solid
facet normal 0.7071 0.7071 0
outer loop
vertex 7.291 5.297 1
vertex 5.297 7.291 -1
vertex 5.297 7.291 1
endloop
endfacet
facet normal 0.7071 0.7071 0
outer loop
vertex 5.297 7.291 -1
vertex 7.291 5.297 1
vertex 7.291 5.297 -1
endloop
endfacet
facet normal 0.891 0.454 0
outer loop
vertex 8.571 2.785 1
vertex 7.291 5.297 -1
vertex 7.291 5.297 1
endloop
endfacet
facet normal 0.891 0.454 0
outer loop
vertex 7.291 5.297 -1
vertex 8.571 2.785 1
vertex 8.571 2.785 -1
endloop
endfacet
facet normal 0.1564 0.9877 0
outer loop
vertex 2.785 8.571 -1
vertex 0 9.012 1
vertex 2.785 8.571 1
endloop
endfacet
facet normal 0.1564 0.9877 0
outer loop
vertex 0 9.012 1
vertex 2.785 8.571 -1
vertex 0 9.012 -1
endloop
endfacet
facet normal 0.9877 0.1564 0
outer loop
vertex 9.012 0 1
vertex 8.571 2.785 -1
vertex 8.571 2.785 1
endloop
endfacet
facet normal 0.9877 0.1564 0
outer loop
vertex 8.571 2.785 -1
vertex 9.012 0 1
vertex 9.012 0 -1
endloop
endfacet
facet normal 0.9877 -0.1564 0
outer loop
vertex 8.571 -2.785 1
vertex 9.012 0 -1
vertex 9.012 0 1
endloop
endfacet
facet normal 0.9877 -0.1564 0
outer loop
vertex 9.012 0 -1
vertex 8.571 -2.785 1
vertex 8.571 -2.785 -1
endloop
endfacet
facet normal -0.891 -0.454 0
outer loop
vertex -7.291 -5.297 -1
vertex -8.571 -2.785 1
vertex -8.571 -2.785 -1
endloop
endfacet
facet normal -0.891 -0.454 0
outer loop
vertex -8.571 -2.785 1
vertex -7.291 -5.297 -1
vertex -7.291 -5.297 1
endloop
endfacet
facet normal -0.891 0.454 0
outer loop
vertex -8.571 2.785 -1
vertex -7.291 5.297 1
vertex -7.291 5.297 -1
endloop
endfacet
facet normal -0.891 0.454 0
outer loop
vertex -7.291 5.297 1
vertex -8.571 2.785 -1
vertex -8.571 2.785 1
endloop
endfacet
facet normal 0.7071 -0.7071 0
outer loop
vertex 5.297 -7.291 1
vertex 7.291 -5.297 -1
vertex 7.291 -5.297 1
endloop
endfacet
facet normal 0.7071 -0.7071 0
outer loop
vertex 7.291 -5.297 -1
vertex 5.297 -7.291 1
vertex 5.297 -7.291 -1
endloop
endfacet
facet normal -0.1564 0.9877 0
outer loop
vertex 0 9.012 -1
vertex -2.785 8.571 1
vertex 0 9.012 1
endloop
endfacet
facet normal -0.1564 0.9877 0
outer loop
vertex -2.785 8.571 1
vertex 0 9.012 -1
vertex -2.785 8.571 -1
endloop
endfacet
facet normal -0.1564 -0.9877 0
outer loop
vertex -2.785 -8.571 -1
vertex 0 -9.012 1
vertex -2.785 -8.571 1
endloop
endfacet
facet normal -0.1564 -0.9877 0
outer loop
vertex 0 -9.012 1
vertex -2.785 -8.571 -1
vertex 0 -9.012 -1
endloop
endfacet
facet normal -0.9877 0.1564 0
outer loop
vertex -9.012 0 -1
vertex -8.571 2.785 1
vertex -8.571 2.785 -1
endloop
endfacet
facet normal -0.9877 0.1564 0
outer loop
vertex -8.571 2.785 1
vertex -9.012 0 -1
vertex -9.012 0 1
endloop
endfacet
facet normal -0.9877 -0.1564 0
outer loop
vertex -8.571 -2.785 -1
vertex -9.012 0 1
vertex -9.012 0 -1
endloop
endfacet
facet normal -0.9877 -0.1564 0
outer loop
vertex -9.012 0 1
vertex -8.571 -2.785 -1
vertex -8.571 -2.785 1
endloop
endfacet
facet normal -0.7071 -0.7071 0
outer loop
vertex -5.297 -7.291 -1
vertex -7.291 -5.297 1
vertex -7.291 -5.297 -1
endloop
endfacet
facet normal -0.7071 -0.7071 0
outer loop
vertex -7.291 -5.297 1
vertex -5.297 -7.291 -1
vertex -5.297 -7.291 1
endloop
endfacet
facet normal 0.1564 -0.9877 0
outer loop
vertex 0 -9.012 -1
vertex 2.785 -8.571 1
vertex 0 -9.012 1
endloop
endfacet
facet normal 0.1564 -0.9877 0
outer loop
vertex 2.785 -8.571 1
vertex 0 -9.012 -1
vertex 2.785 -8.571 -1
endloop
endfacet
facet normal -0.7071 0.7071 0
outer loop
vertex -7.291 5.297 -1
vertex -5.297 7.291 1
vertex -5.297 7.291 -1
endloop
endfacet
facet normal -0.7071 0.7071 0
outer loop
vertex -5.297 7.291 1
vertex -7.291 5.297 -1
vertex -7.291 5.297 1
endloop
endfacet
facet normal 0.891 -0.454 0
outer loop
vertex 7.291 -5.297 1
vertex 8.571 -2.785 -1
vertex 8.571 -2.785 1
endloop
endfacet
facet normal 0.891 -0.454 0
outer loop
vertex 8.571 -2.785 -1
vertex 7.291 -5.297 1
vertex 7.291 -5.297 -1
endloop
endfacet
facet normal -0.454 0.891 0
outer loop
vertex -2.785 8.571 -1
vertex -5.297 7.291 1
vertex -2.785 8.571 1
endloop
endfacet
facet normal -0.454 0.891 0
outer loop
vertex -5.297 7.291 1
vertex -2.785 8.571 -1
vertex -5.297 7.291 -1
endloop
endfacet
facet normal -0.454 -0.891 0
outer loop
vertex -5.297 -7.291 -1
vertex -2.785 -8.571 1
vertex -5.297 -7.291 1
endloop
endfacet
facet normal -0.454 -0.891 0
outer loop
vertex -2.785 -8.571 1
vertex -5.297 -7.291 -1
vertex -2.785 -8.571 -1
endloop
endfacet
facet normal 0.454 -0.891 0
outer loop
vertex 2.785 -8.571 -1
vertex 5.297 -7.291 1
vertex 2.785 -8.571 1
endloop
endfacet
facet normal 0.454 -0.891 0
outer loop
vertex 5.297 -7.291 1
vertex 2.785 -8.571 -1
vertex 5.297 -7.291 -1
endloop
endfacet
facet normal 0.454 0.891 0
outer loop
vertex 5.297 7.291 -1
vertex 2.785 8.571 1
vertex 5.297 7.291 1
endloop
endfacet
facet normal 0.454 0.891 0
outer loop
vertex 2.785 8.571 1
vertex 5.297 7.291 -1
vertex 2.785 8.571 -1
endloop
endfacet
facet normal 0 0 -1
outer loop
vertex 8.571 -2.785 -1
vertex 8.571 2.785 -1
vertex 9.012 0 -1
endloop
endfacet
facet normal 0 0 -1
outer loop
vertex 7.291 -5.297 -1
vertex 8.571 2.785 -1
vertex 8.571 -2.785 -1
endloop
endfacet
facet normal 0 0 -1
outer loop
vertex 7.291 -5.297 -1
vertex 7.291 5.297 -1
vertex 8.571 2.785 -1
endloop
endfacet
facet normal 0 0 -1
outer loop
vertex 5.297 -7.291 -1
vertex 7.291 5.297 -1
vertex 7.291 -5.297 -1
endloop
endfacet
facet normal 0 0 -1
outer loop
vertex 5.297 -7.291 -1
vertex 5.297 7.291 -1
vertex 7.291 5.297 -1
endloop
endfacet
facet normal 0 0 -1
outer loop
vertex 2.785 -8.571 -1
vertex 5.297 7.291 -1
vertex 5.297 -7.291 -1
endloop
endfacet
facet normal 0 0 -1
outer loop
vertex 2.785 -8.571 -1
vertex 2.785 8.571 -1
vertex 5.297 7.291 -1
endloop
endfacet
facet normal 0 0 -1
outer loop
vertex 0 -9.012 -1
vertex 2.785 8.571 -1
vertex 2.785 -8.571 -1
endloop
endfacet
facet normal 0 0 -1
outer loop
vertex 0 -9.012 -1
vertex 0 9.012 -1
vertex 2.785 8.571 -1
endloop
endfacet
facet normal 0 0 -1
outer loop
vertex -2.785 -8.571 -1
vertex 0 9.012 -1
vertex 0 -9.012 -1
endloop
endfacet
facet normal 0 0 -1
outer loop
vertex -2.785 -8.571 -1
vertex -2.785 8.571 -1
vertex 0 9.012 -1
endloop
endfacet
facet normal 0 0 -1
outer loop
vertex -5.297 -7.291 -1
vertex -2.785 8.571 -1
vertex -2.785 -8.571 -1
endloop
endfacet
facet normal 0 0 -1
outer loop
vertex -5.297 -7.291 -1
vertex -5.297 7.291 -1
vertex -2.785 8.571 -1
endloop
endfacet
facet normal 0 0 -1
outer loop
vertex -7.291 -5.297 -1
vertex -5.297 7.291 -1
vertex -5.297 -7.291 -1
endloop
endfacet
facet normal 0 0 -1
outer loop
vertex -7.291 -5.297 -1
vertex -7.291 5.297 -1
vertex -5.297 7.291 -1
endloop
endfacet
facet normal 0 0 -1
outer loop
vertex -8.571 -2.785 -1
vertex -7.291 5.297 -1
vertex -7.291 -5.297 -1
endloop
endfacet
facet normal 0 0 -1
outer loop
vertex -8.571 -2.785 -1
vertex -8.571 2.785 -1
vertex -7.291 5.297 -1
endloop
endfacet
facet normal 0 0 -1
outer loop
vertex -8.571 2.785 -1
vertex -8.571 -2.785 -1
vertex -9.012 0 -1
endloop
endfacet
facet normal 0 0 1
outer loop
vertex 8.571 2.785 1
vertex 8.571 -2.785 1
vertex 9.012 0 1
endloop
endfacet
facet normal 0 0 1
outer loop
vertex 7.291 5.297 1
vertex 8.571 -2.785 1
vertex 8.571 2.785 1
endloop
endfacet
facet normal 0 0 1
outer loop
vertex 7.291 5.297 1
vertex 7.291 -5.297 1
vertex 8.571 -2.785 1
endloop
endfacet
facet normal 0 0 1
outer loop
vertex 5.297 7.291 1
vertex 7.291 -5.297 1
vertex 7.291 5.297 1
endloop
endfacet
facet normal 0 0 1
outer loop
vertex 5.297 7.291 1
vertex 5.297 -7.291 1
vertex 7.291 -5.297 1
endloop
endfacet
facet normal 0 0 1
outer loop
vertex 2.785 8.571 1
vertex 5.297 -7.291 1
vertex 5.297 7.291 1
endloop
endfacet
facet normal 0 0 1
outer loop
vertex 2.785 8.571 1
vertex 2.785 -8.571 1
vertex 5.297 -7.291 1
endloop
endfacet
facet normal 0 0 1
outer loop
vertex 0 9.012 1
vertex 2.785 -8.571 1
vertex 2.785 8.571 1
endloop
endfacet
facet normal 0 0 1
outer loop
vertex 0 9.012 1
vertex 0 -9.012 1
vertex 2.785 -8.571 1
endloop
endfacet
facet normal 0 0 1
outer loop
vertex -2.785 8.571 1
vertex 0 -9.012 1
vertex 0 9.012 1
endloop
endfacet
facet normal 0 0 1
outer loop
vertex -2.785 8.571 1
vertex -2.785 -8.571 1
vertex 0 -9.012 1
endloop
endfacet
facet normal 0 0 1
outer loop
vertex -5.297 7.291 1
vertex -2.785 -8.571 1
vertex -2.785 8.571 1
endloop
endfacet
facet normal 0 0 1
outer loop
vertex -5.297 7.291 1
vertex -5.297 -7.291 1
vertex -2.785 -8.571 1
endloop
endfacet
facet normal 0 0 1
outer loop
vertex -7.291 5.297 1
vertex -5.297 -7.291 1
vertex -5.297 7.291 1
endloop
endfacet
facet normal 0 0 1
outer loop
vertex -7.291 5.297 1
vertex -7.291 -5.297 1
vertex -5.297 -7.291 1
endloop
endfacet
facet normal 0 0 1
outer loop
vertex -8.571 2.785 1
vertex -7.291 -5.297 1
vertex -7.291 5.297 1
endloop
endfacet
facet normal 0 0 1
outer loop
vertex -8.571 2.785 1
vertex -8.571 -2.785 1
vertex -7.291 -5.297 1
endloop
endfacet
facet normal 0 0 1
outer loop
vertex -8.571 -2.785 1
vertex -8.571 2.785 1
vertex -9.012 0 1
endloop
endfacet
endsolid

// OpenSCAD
$fn=20;
wheelRadInner=10;
wheelRadOuter=wheelRadInner+2;
wheelHeight=4;
wheelHingeRad=4;

wheel();

module wheel()
{
    difference()
        {
        cylinder(r=wheelRadOuter, h=wheelHeight/2, center=true);
        minkowski()
       {
            difference()
            {
                cylinder(r=wheelRadOuter, h=wheelHeight/2, center=true);
                cylinder(r=wheelRadInner, h=wheelHeight*2, center=true);
            }
            sphere(r=wheelHeight/4);
        }    
    }
}
